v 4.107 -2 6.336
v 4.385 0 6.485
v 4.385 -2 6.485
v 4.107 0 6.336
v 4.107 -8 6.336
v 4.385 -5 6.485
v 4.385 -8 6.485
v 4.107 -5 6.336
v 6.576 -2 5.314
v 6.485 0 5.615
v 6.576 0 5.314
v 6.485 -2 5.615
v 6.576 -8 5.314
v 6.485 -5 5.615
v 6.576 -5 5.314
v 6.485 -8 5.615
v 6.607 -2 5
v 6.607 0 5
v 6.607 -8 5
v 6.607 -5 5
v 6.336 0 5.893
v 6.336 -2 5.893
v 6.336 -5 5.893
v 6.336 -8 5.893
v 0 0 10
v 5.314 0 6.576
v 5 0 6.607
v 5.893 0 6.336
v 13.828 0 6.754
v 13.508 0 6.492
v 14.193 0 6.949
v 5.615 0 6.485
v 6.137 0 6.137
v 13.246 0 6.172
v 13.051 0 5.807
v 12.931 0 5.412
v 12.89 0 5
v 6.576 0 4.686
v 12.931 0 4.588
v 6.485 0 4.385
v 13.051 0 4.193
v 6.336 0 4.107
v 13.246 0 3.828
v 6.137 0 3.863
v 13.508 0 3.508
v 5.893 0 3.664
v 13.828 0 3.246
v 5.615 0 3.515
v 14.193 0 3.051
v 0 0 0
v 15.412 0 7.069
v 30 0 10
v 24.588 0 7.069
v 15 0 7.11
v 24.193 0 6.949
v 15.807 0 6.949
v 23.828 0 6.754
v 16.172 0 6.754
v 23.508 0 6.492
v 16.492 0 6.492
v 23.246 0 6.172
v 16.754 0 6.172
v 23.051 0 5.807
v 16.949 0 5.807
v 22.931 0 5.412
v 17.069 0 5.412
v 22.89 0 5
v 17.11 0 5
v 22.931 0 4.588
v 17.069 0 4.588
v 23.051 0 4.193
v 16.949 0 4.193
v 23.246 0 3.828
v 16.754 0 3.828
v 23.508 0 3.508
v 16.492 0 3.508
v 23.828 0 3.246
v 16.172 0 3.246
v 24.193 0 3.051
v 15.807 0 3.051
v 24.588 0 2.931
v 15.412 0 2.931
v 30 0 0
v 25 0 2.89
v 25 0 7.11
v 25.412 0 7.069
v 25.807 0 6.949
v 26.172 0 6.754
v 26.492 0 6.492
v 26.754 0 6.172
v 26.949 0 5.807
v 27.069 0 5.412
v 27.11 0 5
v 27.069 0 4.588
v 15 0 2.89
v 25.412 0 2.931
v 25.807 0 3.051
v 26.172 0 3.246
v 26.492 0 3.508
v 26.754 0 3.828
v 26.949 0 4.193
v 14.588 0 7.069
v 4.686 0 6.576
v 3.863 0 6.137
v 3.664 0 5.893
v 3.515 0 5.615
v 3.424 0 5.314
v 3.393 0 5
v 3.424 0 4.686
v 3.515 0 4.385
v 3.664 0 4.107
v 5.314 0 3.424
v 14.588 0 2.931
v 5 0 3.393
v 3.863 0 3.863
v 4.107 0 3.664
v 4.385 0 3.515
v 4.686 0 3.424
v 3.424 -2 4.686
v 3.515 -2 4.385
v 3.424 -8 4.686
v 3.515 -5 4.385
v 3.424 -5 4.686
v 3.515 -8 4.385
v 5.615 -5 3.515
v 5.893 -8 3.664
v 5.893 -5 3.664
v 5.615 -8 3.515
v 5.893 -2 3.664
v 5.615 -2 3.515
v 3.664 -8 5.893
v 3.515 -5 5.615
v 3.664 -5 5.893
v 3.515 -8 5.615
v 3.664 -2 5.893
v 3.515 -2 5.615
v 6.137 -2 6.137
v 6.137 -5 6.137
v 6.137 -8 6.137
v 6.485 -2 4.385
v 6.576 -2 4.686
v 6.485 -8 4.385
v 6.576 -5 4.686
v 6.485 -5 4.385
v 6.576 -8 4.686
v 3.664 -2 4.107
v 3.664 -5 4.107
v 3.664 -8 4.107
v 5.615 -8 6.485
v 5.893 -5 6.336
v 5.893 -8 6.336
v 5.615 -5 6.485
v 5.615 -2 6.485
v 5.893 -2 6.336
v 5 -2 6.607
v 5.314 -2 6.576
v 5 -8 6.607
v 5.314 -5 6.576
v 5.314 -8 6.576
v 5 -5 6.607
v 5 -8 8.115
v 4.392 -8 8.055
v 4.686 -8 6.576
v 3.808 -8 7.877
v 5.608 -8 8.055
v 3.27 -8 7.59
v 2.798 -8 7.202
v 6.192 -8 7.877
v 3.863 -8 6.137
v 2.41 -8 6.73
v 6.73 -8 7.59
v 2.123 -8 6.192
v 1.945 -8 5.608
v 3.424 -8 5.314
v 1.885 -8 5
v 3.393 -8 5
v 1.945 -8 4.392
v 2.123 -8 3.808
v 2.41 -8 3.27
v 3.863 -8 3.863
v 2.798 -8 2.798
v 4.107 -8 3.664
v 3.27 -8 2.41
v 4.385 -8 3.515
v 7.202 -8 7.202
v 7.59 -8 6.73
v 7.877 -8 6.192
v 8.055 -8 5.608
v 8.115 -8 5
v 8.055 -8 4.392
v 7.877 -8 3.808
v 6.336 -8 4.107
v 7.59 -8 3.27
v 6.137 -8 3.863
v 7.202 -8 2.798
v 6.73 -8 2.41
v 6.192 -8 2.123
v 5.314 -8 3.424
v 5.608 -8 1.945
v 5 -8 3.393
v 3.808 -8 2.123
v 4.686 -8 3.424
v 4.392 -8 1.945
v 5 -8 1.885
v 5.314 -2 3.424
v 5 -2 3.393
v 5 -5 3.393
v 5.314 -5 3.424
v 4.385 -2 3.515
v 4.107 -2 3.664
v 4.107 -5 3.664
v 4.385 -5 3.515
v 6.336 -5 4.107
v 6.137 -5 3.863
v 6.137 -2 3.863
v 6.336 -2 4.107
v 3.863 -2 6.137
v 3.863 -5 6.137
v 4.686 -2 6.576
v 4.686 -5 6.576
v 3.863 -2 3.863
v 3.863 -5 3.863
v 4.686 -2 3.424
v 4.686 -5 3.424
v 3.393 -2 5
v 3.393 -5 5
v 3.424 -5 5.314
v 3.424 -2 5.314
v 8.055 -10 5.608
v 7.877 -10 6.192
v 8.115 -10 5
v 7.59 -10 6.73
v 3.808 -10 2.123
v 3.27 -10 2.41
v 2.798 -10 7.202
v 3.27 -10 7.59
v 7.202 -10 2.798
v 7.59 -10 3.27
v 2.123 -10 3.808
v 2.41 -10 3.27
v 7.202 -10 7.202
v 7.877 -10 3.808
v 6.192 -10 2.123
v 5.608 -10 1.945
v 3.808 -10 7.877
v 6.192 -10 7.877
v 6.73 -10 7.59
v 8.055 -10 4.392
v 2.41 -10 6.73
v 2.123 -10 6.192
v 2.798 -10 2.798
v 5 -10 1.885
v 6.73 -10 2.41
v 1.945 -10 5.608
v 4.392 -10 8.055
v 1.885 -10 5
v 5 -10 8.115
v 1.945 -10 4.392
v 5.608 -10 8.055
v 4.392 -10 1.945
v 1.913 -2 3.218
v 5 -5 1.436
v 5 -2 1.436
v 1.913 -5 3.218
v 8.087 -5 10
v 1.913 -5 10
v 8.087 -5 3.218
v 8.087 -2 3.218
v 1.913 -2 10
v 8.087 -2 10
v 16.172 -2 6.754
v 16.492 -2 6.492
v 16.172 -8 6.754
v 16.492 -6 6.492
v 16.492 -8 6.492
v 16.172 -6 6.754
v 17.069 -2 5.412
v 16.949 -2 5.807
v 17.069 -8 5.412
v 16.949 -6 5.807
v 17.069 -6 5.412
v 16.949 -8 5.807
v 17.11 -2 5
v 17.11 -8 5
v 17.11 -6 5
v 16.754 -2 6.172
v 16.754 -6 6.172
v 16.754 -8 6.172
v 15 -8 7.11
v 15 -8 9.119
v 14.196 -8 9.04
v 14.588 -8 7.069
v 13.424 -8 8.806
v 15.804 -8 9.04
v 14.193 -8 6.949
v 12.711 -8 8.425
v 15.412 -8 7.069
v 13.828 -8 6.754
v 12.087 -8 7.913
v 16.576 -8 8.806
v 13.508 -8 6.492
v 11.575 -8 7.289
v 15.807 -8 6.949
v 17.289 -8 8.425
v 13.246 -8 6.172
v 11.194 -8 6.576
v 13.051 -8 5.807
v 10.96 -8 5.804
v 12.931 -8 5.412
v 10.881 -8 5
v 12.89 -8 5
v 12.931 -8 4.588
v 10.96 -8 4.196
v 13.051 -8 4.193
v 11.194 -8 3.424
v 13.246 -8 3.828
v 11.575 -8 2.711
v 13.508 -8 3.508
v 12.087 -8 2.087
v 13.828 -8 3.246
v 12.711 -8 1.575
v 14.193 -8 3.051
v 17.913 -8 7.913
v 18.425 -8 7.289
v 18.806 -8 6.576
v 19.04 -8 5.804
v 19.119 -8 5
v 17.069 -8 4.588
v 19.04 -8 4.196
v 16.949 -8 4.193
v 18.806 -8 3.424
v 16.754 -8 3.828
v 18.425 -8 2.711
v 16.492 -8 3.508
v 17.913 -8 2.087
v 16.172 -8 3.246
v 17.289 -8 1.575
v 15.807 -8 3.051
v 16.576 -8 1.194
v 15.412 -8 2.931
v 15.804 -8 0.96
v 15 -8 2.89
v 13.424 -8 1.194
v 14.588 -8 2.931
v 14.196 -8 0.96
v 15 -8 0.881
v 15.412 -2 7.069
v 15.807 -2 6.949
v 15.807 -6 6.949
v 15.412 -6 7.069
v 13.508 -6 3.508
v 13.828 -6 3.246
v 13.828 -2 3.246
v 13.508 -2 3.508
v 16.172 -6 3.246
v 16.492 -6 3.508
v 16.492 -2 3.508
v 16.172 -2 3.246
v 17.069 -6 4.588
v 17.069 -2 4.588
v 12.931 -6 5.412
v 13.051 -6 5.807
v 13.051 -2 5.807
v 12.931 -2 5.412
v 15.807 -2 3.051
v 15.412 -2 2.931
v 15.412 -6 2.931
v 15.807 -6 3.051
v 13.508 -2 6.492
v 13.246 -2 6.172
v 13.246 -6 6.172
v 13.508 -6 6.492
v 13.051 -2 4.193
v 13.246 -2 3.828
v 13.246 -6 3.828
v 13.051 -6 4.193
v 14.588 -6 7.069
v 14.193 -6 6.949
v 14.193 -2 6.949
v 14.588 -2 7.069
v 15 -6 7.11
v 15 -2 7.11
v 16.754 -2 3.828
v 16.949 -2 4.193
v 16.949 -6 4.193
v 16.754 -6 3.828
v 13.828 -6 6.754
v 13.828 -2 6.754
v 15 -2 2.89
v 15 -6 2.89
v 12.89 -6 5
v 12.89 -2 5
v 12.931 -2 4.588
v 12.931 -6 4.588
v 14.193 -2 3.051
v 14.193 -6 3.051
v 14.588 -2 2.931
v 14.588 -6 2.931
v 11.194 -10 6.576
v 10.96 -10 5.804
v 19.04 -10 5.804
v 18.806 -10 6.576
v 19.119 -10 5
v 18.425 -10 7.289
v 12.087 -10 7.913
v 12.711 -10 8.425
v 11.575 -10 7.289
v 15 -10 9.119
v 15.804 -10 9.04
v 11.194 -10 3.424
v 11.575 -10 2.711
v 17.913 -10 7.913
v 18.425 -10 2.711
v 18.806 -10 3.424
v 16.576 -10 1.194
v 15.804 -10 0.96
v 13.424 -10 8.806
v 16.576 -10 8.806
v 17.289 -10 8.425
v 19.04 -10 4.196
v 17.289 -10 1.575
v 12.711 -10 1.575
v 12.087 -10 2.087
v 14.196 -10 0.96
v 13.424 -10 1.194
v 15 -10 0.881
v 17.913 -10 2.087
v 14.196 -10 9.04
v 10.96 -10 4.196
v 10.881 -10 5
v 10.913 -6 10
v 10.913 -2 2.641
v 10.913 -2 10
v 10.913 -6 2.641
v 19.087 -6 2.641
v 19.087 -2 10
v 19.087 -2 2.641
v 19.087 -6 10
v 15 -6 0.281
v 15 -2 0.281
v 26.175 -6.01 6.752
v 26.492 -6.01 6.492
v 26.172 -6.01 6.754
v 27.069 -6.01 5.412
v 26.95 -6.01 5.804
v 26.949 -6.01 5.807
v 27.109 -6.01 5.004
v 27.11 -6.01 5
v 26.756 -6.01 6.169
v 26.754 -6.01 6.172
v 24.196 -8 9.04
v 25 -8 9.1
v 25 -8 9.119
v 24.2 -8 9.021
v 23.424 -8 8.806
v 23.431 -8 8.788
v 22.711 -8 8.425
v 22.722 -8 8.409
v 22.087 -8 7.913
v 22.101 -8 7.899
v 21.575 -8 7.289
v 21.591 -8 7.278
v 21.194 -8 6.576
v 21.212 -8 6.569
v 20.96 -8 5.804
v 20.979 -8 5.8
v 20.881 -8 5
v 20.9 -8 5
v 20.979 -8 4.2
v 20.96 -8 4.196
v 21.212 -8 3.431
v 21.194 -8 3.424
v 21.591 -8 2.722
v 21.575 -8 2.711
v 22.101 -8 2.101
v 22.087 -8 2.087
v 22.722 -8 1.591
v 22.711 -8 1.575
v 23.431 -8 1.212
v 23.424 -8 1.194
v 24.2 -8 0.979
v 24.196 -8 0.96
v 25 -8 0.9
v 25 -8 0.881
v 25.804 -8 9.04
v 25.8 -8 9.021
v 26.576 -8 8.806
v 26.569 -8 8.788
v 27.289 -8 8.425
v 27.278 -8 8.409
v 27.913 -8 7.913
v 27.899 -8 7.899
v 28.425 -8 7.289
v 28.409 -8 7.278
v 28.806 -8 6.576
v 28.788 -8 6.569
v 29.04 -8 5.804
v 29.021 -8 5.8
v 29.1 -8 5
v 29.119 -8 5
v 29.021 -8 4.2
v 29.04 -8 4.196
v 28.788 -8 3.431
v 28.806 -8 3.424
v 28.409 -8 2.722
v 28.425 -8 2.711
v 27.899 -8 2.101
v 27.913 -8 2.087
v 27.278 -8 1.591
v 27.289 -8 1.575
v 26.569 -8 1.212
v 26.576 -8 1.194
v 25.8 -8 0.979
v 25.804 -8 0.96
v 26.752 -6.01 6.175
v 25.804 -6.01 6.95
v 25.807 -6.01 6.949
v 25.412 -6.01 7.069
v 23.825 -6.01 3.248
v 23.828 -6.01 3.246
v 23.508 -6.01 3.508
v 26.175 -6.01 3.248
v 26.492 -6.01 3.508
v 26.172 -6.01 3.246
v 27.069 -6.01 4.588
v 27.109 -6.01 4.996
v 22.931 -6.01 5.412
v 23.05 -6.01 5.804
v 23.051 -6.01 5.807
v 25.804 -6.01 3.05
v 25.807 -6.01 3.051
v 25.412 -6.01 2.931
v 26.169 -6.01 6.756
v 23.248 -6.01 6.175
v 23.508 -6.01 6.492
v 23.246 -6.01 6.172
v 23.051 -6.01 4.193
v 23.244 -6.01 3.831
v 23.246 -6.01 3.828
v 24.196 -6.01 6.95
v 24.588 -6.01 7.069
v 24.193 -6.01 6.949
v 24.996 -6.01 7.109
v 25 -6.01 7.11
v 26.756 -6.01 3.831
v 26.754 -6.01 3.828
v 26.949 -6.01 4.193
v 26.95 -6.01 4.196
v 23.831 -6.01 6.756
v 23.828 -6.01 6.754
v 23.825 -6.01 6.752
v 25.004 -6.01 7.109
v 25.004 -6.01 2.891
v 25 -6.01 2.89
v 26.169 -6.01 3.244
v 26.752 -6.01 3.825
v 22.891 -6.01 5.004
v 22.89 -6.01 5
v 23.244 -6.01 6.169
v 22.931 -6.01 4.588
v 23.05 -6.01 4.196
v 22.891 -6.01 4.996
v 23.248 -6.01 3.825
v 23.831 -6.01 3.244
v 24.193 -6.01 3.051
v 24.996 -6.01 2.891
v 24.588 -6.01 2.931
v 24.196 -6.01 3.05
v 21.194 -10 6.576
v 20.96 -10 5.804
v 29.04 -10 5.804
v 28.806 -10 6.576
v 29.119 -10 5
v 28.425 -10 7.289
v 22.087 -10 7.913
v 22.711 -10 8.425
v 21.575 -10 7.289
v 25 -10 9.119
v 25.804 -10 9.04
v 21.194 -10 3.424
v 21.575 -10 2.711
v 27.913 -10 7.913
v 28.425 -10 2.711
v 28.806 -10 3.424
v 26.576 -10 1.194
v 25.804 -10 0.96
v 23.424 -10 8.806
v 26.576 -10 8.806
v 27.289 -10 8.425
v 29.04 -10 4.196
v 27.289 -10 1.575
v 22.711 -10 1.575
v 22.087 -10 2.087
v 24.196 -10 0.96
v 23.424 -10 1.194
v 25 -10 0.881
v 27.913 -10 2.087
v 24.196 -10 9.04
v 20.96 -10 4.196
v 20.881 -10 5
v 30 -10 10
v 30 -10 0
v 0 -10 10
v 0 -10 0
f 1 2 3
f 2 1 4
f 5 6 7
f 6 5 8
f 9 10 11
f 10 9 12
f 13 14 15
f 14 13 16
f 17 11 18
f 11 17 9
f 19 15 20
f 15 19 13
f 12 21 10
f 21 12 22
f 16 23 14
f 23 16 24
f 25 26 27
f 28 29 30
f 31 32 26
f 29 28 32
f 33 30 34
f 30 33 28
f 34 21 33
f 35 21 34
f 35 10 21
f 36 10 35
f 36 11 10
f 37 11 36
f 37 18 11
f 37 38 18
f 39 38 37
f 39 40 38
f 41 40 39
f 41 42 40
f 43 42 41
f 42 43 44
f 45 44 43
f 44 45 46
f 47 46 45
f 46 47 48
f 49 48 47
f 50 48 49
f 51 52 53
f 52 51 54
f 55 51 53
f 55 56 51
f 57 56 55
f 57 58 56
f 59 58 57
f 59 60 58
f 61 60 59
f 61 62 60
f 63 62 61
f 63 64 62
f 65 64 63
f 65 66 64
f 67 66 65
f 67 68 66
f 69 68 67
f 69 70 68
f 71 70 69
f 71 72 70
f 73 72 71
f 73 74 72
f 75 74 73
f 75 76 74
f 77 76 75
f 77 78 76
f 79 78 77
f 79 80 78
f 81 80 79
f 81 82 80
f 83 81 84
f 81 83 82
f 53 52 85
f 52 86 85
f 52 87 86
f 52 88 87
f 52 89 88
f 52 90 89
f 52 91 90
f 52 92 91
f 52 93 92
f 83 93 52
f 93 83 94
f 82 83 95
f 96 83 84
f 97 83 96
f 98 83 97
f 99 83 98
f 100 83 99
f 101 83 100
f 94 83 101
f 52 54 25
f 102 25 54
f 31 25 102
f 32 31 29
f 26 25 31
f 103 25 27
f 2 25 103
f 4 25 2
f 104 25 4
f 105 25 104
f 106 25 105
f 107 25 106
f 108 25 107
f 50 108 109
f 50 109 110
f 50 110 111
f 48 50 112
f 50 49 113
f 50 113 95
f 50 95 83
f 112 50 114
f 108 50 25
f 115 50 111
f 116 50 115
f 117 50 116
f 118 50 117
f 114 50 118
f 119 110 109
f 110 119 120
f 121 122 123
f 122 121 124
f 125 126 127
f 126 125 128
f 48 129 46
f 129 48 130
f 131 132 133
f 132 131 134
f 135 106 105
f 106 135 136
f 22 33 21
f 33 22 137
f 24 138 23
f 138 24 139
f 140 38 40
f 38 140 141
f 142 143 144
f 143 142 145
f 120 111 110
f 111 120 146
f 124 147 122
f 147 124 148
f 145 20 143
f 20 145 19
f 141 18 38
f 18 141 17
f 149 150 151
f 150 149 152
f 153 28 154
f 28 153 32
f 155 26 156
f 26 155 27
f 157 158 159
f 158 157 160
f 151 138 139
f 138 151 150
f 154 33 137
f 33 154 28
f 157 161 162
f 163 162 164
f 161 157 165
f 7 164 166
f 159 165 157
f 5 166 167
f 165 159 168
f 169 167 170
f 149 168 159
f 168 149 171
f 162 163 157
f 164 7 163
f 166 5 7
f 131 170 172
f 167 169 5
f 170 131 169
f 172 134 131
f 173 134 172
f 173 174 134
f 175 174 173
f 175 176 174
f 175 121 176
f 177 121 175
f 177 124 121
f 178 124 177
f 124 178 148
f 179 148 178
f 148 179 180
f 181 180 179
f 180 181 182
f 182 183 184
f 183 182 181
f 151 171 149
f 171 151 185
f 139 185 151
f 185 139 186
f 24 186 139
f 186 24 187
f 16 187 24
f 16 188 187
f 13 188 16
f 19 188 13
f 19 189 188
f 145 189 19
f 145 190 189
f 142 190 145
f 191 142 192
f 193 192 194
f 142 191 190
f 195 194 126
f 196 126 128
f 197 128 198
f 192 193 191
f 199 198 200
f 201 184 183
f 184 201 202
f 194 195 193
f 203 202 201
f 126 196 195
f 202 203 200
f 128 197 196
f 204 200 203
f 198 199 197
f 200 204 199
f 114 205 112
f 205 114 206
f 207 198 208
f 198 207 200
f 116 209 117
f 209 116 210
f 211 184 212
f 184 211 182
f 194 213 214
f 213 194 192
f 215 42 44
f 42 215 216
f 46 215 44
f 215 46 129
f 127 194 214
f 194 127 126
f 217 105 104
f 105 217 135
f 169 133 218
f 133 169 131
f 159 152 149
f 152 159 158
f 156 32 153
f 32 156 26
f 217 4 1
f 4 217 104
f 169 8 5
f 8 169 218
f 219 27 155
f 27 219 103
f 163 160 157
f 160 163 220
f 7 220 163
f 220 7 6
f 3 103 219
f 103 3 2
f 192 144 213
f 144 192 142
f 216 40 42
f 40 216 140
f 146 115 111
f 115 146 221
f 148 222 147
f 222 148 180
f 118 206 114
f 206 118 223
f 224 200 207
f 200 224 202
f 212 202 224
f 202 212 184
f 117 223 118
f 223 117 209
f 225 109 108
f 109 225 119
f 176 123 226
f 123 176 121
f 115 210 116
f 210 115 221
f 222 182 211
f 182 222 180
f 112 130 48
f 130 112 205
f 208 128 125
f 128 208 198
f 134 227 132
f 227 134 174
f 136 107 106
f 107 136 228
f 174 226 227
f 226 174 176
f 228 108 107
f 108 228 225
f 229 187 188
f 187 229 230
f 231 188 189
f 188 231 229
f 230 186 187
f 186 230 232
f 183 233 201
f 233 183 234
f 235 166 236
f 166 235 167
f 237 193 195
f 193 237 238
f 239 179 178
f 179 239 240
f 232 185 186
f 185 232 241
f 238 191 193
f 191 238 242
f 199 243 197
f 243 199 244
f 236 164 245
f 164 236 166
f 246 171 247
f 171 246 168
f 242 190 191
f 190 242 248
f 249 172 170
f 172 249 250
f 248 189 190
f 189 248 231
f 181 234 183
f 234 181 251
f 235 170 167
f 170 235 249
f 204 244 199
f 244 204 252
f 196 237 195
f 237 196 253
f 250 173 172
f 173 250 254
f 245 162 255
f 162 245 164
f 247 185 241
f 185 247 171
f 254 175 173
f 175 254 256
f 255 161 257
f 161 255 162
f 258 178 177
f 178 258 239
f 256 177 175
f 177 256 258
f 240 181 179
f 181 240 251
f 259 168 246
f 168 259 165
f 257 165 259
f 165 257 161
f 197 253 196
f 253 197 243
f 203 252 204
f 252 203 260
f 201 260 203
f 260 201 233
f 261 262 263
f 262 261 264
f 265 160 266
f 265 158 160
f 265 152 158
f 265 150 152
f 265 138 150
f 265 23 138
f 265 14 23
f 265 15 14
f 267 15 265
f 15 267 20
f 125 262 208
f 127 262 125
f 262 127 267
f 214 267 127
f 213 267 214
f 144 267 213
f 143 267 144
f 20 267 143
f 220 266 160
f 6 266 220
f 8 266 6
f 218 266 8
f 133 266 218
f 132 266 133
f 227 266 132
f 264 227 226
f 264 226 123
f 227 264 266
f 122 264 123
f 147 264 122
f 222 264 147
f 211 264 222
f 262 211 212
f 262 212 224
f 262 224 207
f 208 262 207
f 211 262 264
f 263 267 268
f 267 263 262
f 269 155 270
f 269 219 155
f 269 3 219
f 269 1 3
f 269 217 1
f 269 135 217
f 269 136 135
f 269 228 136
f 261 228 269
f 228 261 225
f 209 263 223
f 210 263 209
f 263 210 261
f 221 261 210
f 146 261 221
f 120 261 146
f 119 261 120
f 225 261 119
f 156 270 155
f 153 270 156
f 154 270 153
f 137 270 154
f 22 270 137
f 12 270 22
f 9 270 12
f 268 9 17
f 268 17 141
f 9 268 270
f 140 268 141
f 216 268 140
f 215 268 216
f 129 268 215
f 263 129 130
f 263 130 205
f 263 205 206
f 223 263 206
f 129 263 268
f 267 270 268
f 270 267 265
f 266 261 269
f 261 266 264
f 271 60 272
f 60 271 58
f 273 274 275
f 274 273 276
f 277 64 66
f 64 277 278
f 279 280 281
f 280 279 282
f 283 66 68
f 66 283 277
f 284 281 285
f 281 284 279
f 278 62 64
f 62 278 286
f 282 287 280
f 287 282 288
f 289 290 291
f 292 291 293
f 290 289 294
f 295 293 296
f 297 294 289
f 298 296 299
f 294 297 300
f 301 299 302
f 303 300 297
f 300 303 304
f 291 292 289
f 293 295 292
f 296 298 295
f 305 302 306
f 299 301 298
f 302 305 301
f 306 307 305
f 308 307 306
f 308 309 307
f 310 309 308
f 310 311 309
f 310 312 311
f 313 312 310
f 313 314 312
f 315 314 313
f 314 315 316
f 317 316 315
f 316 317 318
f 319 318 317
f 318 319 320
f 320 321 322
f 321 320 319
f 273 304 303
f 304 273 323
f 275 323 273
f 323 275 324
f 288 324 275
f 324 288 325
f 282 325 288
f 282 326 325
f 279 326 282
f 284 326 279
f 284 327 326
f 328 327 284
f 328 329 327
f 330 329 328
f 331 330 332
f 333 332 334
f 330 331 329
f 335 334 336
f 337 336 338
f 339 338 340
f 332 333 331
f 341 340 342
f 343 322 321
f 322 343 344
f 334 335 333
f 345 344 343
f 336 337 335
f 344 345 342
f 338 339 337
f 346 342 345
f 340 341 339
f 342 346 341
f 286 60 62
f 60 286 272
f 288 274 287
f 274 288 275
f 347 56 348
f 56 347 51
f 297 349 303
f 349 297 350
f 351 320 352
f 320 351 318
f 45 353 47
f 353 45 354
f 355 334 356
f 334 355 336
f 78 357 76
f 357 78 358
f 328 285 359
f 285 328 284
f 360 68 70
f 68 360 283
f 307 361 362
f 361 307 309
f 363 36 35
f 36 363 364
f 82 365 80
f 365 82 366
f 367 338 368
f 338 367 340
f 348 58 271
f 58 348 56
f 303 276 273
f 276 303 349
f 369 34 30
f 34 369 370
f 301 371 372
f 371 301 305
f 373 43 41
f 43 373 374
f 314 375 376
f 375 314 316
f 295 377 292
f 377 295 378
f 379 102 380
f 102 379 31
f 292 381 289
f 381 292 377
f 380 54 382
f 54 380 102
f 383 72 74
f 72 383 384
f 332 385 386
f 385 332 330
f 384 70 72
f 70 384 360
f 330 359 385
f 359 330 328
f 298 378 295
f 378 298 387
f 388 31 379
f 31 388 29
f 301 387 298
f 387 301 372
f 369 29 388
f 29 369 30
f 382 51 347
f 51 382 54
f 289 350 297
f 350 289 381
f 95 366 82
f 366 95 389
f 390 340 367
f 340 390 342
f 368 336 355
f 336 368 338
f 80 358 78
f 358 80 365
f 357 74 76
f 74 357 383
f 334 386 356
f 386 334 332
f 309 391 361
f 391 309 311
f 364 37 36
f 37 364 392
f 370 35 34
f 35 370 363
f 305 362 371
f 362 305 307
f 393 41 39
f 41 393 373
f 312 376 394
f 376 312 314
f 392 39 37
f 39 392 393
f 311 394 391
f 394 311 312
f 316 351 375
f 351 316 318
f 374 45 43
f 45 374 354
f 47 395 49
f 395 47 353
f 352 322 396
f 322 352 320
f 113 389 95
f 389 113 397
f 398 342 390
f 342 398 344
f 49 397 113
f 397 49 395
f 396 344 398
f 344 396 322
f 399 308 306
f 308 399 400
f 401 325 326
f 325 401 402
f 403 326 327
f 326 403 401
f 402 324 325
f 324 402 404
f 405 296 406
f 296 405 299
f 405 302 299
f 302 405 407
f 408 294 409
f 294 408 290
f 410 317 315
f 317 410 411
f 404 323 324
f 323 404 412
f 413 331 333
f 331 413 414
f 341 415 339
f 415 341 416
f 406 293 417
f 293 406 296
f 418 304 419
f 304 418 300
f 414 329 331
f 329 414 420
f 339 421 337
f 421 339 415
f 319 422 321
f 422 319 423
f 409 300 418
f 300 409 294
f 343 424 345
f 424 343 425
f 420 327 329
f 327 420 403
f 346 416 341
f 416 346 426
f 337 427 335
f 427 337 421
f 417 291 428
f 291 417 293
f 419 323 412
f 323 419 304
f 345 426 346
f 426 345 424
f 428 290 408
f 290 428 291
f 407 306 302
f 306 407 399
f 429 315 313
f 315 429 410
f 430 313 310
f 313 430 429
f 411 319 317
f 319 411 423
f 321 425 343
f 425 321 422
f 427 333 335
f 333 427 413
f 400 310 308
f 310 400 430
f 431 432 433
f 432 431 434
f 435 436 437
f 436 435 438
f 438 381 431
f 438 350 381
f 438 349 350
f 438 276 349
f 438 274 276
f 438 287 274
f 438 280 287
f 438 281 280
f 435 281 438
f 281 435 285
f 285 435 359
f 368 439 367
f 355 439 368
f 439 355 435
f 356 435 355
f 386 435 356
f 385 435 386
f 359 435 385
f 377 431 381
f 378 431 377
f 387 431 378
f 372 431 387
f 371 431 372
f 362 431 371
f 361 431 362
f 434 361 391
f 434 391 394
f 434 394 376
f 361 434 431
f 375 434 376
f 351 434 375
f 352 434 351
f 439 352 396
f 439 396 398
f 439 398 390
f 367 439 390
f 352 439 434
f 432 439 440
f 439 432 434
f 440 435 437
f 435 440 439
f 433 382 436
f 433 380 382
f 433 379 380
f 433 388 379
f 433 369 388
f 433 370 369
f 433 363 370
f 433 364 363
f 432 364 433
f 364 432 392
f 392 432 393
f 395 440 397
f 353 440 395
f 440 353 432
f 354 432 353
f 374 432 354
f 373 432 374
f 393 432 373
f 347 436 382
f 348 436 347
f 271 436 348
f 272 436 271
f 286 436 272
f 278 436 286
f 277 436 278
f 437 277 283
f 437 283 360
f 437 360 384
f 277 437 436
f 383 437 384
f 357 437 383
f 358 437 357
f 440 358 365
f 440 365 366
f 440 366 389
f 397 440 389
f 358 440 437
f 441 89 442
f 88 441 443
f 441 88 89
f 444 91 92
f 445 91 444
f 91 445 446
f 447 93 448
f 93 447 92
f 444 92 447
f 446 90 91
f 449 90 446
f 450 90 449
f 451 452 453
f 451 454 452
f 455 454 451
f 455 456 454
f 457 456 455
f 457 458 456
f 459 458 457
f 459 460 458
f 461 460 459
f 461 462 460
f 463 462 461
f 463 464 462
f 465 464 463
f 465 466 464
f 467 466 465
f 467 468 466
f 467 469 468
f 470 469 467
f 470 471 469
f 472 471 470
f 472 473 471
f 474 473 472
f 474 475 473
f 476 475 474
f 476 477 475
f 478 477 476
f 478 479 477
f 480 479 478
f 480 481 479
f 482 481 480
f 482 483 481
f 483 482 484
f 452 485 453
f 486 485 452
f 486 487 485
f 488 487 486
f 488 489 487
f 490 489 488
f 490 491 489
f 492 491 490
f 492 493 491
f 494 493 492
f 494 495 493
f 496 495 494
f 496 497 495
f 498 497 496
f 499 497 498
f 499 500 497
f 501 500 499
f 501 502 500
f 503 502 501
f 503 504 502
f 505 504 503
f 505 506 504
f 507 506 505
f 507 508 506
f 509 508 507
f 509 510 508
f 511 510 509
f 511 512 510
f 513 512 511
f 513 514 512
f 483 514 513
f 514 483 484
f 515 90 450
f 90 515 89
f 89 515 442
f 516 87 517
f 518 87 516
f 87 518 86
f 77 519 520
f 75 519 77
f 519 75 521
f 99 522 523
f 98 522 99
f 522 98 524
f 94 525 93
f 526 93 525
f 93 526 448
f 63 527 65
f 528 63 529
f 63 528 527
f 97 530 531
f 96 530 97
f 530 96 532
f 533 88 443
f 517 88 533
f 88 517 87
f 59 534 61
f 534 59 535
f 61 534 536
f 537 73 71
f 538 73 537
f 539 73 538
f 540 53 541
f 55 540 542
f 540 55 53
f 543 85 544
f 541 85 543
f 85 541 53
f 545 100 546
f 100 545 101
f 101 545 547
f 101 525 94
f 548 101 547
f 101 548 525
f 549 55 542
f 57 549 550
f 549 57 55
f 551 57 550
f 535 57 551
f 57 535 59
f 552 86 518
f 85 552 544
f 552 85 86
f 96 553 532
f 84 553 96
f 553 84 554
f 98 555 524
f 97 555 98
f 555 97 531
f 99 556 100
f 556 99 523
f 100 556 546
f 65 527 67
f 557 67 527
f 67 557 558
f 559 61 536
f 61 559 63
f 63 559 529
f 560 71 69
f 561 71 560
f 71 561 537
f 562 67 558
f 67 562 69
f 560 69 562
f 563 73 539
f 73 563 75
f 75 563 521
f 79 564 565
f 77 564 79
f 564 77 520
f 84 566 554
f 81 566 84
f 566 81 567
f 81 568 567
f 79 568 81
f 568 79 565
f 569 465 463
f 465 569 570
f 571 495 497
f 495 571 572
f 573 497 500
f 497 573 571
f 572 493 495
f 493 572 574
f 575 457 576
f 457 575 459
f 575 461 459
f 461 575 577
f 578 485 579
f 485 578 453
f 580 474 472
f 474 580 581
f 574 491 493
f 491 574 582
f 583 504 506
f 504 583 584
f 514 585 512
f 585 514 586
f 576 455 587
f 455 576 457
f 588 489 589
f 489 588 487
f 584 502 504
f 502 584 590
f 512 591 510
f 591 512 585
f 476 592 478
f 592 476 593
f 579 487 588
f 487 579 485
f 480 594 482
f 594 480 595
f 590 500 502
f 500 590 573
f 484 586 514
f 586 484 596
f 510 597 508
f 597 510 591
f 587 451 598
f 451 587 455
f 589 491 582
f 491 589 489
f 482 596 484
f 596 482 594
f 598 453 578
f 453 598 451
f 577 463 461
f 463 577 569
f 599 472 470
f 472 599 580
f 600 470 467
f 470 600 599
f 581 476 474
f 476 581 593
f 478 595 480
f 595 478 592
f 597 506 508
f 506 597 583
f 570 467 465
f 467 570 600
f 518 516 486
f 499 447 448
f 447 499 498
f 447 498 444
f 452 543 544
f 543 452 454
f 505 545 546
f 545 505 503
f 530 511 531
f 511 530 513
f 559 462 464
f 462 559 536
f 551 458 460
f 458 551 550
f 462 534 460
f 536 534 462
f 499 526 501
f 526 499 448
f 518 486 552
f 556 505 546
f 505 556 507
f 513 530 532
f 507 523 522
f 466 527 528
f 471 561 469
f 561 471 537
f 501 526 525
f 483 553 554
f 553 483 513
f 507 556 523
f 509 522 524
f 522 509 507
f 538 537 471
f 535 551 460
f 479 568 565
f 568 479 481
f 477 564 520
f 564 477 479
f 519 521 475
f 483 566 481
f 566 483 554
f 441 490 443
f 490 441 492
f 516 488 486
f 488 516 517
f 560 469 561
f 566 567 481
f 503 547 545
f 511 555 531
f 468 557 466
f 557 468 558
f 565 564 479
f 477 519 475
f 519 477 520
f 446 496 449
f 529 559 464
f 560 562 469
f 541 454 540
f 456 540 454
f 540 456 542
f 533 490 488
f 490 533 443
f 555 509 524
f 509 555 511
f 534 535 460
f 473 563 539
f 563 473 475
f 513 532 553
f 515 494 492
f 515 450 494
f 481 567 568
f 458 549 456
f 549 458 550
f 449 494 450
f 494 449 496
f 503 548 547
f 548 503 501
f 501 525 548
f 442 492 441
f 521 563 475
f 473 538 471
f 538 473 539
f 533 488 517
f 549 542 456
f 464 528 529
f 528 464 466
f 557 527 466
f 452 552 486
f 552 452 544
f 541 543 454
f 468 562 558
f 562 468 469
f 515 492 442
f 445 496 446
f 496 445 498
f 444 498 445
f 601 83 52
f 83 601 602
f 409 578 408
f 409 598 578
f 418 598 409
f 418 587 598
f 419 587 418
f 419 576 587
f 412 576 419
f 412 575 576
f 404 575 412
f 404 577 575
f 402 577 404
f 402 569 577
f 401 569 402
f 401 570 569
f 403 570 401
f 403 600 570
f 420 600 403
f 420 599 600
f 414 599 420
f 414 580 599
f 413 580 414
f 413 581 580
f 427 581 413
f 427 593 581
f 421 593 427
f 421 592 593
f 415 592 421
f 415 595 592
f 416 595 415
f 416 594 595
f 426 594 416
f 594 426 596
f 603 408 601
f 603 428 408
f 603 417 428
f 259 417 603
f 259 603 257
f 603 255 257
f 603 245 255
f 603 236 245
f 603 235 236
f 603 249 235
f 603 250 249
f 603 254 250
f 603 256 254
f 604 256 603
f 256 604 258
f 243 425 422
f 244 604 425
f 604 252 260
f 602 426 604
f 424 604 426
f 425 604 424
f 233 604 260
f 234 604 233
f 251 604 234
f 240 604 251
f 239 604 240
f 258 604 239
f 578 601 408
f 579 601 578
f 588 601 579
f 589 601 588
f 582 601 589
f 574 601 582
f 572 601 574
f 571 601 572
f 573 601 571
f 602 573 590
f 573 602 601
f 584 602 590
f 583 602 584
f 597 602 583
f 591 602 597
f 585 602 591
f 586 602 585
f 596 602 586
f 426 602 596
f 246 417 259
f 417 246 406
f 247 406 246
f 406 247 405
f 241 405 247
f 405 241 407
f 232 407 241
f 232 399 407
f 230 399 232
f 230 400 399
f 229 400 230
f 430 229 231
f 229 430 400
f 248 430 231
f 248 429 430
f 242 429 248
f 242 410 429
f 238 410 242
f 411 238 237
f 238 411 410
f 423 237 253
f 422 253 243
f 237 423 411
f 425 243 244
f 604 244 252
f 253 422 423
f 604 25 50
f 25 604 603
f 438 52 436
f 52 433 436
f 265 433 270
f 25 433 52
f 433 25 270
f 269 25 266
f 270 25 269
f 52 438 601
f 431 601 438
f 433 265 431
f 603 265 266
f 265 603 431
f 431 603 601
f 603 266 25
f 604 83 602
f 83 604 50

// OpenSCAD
$radial_error = 0.1;
$fn = 32;

module cylinder_outer(height, radius, fn=$fn) {
	fudge = 1/cos(180/fn);
	cylinder(h=height,r=radius*fudge+$radial_error, $fn=fn);
}

module cylinder_inner(height, radius, fn=$fn) {
	cylinder(h=height,r=radius-$radial_error,$fn=fn);
}

// Make a hole for a bolt/screw combination.
module bolt(diameter=3, depth=8, nut_offset=2, shaft_length=10, inset=10) {
	hole(diameter, depth, inset);
	hull() {
		shaft_width = diameter;
		translate([0, 0, nut_offset]) rotate(360/12, [0, 0, 1]) cylinder_outer(diameter, shaft_width, 6);
		translate([0, shaft_length, nut_offset]) rotate(360/12, [0, 0, 1]) cylinder_outer(diameter, shaft_width, 6);
	}
}

// Make a hole. The diameter is the size of the screw (e.g. 3 for M3). Depth is how far the hole should go for the thread, and inset is how far out there should be a hole for the head to go.
module hole(diameter=3, depth=6, inset=10) {
	cylinder_outer(depth, diameter/2);
	translate([0, 0, depth]) cylinder_outer(inset, diameter, 32);
}

module countersunk_hole(diameter=3, depth=6, inset=10) {
	hole(diameter, depth, inset);
	translate([0, 0, depth-diameter/2]) cylinder(r1=diameter/2+$radial_error, r2=diameter+$radial_error, h=diameter/2);
}

module mounting_hole(diameter=3, depth=6, inset=10, outset=3) {
	difference() {
		cylinder_outer(depth, diameter/2+outset);
		hole(diameter=diameter, depth=depth, inset=inset);
	}
}

rotate(90, [1, 0, 0]) difference() {
	cube([30, 10, 10]);
	translate([5, 5, 0]) bolt(diameter=3, depth=8);
	translate([15, 5, 0]) bolt(diameter=4, depth=8);
	translate([25, 5, 0]) countersunk_hole(diameter=4, depth=8);
}
